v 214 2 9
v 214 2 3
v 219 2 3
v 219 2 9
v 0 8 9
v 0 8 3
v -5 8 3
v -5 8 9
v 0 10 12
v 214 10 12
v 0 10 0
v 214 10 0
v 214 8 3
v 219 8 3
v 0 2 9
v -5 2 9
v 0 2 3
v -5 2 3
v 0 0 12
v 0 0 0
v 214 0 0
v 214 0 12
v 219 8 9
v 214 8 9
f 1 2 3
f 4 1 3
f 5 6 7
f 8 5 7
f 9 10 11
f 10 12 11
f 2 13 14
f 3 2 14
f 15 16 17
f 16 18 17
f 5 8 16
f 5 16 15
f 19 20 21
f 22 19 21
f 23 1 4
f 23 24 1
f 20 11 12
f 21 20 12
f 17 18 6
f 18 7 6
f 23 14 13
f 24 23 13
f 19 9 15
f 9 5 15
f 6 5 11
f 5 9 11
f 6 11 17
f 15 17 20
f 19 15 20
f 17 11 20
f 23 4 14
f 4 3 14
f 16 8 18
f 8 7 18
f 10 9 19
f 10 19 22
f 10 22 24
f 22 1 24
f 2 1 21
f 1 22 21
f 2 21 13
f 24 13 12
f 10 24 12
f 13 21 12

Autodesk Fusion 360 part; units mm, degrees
sketch "Sketch1" plane through (0, 0, 0) normal (0, 0, 1) x (1, 0, 0)
  line L0 (0, 0) -> (214, 0)
  line L1 (214, 0) -> (214, 10)
  line L2 (214, 10) -> (0, 10)
  line L3 (0, 10) -> (0, 0)
extrude "Extrude1" add sketch "Sketch1" along normal blind 12 makes body 1
sketch "Sketch2" plane through (0, 0, 0) normal (0, 0, 1) x (1, 0, 0)
  line L0 (-5, 2) -> (0, 2)
  line L1 (0, 2) -> (0, 8)
  line L2 (0, 8) -> (-5, 8)
  line L3 (-5, 8) -> (-5, 2)
extrude "Extrude2" add sketch "Sketch2" along normal blind 6 from surface at 3 separate body makes body 2
sketch "Sketch3" plane through (0, 0, 0) normal (0, 0, 1) x (1, 0, 0)
  line L0 (214, 2) -> (219, 2)
  line L1 (219, 2) -> (219, 8)
  line L2 (219, 8) -> (214, 8)
  line L3 (214, 8) -> (214, 2)
extrude "Extrude3" add sketch "Sketch3" along normal blind 6 from surface at 3 separate body makes body 3
combine "Combine1" operation add target body 1 tool bodies 2 3
